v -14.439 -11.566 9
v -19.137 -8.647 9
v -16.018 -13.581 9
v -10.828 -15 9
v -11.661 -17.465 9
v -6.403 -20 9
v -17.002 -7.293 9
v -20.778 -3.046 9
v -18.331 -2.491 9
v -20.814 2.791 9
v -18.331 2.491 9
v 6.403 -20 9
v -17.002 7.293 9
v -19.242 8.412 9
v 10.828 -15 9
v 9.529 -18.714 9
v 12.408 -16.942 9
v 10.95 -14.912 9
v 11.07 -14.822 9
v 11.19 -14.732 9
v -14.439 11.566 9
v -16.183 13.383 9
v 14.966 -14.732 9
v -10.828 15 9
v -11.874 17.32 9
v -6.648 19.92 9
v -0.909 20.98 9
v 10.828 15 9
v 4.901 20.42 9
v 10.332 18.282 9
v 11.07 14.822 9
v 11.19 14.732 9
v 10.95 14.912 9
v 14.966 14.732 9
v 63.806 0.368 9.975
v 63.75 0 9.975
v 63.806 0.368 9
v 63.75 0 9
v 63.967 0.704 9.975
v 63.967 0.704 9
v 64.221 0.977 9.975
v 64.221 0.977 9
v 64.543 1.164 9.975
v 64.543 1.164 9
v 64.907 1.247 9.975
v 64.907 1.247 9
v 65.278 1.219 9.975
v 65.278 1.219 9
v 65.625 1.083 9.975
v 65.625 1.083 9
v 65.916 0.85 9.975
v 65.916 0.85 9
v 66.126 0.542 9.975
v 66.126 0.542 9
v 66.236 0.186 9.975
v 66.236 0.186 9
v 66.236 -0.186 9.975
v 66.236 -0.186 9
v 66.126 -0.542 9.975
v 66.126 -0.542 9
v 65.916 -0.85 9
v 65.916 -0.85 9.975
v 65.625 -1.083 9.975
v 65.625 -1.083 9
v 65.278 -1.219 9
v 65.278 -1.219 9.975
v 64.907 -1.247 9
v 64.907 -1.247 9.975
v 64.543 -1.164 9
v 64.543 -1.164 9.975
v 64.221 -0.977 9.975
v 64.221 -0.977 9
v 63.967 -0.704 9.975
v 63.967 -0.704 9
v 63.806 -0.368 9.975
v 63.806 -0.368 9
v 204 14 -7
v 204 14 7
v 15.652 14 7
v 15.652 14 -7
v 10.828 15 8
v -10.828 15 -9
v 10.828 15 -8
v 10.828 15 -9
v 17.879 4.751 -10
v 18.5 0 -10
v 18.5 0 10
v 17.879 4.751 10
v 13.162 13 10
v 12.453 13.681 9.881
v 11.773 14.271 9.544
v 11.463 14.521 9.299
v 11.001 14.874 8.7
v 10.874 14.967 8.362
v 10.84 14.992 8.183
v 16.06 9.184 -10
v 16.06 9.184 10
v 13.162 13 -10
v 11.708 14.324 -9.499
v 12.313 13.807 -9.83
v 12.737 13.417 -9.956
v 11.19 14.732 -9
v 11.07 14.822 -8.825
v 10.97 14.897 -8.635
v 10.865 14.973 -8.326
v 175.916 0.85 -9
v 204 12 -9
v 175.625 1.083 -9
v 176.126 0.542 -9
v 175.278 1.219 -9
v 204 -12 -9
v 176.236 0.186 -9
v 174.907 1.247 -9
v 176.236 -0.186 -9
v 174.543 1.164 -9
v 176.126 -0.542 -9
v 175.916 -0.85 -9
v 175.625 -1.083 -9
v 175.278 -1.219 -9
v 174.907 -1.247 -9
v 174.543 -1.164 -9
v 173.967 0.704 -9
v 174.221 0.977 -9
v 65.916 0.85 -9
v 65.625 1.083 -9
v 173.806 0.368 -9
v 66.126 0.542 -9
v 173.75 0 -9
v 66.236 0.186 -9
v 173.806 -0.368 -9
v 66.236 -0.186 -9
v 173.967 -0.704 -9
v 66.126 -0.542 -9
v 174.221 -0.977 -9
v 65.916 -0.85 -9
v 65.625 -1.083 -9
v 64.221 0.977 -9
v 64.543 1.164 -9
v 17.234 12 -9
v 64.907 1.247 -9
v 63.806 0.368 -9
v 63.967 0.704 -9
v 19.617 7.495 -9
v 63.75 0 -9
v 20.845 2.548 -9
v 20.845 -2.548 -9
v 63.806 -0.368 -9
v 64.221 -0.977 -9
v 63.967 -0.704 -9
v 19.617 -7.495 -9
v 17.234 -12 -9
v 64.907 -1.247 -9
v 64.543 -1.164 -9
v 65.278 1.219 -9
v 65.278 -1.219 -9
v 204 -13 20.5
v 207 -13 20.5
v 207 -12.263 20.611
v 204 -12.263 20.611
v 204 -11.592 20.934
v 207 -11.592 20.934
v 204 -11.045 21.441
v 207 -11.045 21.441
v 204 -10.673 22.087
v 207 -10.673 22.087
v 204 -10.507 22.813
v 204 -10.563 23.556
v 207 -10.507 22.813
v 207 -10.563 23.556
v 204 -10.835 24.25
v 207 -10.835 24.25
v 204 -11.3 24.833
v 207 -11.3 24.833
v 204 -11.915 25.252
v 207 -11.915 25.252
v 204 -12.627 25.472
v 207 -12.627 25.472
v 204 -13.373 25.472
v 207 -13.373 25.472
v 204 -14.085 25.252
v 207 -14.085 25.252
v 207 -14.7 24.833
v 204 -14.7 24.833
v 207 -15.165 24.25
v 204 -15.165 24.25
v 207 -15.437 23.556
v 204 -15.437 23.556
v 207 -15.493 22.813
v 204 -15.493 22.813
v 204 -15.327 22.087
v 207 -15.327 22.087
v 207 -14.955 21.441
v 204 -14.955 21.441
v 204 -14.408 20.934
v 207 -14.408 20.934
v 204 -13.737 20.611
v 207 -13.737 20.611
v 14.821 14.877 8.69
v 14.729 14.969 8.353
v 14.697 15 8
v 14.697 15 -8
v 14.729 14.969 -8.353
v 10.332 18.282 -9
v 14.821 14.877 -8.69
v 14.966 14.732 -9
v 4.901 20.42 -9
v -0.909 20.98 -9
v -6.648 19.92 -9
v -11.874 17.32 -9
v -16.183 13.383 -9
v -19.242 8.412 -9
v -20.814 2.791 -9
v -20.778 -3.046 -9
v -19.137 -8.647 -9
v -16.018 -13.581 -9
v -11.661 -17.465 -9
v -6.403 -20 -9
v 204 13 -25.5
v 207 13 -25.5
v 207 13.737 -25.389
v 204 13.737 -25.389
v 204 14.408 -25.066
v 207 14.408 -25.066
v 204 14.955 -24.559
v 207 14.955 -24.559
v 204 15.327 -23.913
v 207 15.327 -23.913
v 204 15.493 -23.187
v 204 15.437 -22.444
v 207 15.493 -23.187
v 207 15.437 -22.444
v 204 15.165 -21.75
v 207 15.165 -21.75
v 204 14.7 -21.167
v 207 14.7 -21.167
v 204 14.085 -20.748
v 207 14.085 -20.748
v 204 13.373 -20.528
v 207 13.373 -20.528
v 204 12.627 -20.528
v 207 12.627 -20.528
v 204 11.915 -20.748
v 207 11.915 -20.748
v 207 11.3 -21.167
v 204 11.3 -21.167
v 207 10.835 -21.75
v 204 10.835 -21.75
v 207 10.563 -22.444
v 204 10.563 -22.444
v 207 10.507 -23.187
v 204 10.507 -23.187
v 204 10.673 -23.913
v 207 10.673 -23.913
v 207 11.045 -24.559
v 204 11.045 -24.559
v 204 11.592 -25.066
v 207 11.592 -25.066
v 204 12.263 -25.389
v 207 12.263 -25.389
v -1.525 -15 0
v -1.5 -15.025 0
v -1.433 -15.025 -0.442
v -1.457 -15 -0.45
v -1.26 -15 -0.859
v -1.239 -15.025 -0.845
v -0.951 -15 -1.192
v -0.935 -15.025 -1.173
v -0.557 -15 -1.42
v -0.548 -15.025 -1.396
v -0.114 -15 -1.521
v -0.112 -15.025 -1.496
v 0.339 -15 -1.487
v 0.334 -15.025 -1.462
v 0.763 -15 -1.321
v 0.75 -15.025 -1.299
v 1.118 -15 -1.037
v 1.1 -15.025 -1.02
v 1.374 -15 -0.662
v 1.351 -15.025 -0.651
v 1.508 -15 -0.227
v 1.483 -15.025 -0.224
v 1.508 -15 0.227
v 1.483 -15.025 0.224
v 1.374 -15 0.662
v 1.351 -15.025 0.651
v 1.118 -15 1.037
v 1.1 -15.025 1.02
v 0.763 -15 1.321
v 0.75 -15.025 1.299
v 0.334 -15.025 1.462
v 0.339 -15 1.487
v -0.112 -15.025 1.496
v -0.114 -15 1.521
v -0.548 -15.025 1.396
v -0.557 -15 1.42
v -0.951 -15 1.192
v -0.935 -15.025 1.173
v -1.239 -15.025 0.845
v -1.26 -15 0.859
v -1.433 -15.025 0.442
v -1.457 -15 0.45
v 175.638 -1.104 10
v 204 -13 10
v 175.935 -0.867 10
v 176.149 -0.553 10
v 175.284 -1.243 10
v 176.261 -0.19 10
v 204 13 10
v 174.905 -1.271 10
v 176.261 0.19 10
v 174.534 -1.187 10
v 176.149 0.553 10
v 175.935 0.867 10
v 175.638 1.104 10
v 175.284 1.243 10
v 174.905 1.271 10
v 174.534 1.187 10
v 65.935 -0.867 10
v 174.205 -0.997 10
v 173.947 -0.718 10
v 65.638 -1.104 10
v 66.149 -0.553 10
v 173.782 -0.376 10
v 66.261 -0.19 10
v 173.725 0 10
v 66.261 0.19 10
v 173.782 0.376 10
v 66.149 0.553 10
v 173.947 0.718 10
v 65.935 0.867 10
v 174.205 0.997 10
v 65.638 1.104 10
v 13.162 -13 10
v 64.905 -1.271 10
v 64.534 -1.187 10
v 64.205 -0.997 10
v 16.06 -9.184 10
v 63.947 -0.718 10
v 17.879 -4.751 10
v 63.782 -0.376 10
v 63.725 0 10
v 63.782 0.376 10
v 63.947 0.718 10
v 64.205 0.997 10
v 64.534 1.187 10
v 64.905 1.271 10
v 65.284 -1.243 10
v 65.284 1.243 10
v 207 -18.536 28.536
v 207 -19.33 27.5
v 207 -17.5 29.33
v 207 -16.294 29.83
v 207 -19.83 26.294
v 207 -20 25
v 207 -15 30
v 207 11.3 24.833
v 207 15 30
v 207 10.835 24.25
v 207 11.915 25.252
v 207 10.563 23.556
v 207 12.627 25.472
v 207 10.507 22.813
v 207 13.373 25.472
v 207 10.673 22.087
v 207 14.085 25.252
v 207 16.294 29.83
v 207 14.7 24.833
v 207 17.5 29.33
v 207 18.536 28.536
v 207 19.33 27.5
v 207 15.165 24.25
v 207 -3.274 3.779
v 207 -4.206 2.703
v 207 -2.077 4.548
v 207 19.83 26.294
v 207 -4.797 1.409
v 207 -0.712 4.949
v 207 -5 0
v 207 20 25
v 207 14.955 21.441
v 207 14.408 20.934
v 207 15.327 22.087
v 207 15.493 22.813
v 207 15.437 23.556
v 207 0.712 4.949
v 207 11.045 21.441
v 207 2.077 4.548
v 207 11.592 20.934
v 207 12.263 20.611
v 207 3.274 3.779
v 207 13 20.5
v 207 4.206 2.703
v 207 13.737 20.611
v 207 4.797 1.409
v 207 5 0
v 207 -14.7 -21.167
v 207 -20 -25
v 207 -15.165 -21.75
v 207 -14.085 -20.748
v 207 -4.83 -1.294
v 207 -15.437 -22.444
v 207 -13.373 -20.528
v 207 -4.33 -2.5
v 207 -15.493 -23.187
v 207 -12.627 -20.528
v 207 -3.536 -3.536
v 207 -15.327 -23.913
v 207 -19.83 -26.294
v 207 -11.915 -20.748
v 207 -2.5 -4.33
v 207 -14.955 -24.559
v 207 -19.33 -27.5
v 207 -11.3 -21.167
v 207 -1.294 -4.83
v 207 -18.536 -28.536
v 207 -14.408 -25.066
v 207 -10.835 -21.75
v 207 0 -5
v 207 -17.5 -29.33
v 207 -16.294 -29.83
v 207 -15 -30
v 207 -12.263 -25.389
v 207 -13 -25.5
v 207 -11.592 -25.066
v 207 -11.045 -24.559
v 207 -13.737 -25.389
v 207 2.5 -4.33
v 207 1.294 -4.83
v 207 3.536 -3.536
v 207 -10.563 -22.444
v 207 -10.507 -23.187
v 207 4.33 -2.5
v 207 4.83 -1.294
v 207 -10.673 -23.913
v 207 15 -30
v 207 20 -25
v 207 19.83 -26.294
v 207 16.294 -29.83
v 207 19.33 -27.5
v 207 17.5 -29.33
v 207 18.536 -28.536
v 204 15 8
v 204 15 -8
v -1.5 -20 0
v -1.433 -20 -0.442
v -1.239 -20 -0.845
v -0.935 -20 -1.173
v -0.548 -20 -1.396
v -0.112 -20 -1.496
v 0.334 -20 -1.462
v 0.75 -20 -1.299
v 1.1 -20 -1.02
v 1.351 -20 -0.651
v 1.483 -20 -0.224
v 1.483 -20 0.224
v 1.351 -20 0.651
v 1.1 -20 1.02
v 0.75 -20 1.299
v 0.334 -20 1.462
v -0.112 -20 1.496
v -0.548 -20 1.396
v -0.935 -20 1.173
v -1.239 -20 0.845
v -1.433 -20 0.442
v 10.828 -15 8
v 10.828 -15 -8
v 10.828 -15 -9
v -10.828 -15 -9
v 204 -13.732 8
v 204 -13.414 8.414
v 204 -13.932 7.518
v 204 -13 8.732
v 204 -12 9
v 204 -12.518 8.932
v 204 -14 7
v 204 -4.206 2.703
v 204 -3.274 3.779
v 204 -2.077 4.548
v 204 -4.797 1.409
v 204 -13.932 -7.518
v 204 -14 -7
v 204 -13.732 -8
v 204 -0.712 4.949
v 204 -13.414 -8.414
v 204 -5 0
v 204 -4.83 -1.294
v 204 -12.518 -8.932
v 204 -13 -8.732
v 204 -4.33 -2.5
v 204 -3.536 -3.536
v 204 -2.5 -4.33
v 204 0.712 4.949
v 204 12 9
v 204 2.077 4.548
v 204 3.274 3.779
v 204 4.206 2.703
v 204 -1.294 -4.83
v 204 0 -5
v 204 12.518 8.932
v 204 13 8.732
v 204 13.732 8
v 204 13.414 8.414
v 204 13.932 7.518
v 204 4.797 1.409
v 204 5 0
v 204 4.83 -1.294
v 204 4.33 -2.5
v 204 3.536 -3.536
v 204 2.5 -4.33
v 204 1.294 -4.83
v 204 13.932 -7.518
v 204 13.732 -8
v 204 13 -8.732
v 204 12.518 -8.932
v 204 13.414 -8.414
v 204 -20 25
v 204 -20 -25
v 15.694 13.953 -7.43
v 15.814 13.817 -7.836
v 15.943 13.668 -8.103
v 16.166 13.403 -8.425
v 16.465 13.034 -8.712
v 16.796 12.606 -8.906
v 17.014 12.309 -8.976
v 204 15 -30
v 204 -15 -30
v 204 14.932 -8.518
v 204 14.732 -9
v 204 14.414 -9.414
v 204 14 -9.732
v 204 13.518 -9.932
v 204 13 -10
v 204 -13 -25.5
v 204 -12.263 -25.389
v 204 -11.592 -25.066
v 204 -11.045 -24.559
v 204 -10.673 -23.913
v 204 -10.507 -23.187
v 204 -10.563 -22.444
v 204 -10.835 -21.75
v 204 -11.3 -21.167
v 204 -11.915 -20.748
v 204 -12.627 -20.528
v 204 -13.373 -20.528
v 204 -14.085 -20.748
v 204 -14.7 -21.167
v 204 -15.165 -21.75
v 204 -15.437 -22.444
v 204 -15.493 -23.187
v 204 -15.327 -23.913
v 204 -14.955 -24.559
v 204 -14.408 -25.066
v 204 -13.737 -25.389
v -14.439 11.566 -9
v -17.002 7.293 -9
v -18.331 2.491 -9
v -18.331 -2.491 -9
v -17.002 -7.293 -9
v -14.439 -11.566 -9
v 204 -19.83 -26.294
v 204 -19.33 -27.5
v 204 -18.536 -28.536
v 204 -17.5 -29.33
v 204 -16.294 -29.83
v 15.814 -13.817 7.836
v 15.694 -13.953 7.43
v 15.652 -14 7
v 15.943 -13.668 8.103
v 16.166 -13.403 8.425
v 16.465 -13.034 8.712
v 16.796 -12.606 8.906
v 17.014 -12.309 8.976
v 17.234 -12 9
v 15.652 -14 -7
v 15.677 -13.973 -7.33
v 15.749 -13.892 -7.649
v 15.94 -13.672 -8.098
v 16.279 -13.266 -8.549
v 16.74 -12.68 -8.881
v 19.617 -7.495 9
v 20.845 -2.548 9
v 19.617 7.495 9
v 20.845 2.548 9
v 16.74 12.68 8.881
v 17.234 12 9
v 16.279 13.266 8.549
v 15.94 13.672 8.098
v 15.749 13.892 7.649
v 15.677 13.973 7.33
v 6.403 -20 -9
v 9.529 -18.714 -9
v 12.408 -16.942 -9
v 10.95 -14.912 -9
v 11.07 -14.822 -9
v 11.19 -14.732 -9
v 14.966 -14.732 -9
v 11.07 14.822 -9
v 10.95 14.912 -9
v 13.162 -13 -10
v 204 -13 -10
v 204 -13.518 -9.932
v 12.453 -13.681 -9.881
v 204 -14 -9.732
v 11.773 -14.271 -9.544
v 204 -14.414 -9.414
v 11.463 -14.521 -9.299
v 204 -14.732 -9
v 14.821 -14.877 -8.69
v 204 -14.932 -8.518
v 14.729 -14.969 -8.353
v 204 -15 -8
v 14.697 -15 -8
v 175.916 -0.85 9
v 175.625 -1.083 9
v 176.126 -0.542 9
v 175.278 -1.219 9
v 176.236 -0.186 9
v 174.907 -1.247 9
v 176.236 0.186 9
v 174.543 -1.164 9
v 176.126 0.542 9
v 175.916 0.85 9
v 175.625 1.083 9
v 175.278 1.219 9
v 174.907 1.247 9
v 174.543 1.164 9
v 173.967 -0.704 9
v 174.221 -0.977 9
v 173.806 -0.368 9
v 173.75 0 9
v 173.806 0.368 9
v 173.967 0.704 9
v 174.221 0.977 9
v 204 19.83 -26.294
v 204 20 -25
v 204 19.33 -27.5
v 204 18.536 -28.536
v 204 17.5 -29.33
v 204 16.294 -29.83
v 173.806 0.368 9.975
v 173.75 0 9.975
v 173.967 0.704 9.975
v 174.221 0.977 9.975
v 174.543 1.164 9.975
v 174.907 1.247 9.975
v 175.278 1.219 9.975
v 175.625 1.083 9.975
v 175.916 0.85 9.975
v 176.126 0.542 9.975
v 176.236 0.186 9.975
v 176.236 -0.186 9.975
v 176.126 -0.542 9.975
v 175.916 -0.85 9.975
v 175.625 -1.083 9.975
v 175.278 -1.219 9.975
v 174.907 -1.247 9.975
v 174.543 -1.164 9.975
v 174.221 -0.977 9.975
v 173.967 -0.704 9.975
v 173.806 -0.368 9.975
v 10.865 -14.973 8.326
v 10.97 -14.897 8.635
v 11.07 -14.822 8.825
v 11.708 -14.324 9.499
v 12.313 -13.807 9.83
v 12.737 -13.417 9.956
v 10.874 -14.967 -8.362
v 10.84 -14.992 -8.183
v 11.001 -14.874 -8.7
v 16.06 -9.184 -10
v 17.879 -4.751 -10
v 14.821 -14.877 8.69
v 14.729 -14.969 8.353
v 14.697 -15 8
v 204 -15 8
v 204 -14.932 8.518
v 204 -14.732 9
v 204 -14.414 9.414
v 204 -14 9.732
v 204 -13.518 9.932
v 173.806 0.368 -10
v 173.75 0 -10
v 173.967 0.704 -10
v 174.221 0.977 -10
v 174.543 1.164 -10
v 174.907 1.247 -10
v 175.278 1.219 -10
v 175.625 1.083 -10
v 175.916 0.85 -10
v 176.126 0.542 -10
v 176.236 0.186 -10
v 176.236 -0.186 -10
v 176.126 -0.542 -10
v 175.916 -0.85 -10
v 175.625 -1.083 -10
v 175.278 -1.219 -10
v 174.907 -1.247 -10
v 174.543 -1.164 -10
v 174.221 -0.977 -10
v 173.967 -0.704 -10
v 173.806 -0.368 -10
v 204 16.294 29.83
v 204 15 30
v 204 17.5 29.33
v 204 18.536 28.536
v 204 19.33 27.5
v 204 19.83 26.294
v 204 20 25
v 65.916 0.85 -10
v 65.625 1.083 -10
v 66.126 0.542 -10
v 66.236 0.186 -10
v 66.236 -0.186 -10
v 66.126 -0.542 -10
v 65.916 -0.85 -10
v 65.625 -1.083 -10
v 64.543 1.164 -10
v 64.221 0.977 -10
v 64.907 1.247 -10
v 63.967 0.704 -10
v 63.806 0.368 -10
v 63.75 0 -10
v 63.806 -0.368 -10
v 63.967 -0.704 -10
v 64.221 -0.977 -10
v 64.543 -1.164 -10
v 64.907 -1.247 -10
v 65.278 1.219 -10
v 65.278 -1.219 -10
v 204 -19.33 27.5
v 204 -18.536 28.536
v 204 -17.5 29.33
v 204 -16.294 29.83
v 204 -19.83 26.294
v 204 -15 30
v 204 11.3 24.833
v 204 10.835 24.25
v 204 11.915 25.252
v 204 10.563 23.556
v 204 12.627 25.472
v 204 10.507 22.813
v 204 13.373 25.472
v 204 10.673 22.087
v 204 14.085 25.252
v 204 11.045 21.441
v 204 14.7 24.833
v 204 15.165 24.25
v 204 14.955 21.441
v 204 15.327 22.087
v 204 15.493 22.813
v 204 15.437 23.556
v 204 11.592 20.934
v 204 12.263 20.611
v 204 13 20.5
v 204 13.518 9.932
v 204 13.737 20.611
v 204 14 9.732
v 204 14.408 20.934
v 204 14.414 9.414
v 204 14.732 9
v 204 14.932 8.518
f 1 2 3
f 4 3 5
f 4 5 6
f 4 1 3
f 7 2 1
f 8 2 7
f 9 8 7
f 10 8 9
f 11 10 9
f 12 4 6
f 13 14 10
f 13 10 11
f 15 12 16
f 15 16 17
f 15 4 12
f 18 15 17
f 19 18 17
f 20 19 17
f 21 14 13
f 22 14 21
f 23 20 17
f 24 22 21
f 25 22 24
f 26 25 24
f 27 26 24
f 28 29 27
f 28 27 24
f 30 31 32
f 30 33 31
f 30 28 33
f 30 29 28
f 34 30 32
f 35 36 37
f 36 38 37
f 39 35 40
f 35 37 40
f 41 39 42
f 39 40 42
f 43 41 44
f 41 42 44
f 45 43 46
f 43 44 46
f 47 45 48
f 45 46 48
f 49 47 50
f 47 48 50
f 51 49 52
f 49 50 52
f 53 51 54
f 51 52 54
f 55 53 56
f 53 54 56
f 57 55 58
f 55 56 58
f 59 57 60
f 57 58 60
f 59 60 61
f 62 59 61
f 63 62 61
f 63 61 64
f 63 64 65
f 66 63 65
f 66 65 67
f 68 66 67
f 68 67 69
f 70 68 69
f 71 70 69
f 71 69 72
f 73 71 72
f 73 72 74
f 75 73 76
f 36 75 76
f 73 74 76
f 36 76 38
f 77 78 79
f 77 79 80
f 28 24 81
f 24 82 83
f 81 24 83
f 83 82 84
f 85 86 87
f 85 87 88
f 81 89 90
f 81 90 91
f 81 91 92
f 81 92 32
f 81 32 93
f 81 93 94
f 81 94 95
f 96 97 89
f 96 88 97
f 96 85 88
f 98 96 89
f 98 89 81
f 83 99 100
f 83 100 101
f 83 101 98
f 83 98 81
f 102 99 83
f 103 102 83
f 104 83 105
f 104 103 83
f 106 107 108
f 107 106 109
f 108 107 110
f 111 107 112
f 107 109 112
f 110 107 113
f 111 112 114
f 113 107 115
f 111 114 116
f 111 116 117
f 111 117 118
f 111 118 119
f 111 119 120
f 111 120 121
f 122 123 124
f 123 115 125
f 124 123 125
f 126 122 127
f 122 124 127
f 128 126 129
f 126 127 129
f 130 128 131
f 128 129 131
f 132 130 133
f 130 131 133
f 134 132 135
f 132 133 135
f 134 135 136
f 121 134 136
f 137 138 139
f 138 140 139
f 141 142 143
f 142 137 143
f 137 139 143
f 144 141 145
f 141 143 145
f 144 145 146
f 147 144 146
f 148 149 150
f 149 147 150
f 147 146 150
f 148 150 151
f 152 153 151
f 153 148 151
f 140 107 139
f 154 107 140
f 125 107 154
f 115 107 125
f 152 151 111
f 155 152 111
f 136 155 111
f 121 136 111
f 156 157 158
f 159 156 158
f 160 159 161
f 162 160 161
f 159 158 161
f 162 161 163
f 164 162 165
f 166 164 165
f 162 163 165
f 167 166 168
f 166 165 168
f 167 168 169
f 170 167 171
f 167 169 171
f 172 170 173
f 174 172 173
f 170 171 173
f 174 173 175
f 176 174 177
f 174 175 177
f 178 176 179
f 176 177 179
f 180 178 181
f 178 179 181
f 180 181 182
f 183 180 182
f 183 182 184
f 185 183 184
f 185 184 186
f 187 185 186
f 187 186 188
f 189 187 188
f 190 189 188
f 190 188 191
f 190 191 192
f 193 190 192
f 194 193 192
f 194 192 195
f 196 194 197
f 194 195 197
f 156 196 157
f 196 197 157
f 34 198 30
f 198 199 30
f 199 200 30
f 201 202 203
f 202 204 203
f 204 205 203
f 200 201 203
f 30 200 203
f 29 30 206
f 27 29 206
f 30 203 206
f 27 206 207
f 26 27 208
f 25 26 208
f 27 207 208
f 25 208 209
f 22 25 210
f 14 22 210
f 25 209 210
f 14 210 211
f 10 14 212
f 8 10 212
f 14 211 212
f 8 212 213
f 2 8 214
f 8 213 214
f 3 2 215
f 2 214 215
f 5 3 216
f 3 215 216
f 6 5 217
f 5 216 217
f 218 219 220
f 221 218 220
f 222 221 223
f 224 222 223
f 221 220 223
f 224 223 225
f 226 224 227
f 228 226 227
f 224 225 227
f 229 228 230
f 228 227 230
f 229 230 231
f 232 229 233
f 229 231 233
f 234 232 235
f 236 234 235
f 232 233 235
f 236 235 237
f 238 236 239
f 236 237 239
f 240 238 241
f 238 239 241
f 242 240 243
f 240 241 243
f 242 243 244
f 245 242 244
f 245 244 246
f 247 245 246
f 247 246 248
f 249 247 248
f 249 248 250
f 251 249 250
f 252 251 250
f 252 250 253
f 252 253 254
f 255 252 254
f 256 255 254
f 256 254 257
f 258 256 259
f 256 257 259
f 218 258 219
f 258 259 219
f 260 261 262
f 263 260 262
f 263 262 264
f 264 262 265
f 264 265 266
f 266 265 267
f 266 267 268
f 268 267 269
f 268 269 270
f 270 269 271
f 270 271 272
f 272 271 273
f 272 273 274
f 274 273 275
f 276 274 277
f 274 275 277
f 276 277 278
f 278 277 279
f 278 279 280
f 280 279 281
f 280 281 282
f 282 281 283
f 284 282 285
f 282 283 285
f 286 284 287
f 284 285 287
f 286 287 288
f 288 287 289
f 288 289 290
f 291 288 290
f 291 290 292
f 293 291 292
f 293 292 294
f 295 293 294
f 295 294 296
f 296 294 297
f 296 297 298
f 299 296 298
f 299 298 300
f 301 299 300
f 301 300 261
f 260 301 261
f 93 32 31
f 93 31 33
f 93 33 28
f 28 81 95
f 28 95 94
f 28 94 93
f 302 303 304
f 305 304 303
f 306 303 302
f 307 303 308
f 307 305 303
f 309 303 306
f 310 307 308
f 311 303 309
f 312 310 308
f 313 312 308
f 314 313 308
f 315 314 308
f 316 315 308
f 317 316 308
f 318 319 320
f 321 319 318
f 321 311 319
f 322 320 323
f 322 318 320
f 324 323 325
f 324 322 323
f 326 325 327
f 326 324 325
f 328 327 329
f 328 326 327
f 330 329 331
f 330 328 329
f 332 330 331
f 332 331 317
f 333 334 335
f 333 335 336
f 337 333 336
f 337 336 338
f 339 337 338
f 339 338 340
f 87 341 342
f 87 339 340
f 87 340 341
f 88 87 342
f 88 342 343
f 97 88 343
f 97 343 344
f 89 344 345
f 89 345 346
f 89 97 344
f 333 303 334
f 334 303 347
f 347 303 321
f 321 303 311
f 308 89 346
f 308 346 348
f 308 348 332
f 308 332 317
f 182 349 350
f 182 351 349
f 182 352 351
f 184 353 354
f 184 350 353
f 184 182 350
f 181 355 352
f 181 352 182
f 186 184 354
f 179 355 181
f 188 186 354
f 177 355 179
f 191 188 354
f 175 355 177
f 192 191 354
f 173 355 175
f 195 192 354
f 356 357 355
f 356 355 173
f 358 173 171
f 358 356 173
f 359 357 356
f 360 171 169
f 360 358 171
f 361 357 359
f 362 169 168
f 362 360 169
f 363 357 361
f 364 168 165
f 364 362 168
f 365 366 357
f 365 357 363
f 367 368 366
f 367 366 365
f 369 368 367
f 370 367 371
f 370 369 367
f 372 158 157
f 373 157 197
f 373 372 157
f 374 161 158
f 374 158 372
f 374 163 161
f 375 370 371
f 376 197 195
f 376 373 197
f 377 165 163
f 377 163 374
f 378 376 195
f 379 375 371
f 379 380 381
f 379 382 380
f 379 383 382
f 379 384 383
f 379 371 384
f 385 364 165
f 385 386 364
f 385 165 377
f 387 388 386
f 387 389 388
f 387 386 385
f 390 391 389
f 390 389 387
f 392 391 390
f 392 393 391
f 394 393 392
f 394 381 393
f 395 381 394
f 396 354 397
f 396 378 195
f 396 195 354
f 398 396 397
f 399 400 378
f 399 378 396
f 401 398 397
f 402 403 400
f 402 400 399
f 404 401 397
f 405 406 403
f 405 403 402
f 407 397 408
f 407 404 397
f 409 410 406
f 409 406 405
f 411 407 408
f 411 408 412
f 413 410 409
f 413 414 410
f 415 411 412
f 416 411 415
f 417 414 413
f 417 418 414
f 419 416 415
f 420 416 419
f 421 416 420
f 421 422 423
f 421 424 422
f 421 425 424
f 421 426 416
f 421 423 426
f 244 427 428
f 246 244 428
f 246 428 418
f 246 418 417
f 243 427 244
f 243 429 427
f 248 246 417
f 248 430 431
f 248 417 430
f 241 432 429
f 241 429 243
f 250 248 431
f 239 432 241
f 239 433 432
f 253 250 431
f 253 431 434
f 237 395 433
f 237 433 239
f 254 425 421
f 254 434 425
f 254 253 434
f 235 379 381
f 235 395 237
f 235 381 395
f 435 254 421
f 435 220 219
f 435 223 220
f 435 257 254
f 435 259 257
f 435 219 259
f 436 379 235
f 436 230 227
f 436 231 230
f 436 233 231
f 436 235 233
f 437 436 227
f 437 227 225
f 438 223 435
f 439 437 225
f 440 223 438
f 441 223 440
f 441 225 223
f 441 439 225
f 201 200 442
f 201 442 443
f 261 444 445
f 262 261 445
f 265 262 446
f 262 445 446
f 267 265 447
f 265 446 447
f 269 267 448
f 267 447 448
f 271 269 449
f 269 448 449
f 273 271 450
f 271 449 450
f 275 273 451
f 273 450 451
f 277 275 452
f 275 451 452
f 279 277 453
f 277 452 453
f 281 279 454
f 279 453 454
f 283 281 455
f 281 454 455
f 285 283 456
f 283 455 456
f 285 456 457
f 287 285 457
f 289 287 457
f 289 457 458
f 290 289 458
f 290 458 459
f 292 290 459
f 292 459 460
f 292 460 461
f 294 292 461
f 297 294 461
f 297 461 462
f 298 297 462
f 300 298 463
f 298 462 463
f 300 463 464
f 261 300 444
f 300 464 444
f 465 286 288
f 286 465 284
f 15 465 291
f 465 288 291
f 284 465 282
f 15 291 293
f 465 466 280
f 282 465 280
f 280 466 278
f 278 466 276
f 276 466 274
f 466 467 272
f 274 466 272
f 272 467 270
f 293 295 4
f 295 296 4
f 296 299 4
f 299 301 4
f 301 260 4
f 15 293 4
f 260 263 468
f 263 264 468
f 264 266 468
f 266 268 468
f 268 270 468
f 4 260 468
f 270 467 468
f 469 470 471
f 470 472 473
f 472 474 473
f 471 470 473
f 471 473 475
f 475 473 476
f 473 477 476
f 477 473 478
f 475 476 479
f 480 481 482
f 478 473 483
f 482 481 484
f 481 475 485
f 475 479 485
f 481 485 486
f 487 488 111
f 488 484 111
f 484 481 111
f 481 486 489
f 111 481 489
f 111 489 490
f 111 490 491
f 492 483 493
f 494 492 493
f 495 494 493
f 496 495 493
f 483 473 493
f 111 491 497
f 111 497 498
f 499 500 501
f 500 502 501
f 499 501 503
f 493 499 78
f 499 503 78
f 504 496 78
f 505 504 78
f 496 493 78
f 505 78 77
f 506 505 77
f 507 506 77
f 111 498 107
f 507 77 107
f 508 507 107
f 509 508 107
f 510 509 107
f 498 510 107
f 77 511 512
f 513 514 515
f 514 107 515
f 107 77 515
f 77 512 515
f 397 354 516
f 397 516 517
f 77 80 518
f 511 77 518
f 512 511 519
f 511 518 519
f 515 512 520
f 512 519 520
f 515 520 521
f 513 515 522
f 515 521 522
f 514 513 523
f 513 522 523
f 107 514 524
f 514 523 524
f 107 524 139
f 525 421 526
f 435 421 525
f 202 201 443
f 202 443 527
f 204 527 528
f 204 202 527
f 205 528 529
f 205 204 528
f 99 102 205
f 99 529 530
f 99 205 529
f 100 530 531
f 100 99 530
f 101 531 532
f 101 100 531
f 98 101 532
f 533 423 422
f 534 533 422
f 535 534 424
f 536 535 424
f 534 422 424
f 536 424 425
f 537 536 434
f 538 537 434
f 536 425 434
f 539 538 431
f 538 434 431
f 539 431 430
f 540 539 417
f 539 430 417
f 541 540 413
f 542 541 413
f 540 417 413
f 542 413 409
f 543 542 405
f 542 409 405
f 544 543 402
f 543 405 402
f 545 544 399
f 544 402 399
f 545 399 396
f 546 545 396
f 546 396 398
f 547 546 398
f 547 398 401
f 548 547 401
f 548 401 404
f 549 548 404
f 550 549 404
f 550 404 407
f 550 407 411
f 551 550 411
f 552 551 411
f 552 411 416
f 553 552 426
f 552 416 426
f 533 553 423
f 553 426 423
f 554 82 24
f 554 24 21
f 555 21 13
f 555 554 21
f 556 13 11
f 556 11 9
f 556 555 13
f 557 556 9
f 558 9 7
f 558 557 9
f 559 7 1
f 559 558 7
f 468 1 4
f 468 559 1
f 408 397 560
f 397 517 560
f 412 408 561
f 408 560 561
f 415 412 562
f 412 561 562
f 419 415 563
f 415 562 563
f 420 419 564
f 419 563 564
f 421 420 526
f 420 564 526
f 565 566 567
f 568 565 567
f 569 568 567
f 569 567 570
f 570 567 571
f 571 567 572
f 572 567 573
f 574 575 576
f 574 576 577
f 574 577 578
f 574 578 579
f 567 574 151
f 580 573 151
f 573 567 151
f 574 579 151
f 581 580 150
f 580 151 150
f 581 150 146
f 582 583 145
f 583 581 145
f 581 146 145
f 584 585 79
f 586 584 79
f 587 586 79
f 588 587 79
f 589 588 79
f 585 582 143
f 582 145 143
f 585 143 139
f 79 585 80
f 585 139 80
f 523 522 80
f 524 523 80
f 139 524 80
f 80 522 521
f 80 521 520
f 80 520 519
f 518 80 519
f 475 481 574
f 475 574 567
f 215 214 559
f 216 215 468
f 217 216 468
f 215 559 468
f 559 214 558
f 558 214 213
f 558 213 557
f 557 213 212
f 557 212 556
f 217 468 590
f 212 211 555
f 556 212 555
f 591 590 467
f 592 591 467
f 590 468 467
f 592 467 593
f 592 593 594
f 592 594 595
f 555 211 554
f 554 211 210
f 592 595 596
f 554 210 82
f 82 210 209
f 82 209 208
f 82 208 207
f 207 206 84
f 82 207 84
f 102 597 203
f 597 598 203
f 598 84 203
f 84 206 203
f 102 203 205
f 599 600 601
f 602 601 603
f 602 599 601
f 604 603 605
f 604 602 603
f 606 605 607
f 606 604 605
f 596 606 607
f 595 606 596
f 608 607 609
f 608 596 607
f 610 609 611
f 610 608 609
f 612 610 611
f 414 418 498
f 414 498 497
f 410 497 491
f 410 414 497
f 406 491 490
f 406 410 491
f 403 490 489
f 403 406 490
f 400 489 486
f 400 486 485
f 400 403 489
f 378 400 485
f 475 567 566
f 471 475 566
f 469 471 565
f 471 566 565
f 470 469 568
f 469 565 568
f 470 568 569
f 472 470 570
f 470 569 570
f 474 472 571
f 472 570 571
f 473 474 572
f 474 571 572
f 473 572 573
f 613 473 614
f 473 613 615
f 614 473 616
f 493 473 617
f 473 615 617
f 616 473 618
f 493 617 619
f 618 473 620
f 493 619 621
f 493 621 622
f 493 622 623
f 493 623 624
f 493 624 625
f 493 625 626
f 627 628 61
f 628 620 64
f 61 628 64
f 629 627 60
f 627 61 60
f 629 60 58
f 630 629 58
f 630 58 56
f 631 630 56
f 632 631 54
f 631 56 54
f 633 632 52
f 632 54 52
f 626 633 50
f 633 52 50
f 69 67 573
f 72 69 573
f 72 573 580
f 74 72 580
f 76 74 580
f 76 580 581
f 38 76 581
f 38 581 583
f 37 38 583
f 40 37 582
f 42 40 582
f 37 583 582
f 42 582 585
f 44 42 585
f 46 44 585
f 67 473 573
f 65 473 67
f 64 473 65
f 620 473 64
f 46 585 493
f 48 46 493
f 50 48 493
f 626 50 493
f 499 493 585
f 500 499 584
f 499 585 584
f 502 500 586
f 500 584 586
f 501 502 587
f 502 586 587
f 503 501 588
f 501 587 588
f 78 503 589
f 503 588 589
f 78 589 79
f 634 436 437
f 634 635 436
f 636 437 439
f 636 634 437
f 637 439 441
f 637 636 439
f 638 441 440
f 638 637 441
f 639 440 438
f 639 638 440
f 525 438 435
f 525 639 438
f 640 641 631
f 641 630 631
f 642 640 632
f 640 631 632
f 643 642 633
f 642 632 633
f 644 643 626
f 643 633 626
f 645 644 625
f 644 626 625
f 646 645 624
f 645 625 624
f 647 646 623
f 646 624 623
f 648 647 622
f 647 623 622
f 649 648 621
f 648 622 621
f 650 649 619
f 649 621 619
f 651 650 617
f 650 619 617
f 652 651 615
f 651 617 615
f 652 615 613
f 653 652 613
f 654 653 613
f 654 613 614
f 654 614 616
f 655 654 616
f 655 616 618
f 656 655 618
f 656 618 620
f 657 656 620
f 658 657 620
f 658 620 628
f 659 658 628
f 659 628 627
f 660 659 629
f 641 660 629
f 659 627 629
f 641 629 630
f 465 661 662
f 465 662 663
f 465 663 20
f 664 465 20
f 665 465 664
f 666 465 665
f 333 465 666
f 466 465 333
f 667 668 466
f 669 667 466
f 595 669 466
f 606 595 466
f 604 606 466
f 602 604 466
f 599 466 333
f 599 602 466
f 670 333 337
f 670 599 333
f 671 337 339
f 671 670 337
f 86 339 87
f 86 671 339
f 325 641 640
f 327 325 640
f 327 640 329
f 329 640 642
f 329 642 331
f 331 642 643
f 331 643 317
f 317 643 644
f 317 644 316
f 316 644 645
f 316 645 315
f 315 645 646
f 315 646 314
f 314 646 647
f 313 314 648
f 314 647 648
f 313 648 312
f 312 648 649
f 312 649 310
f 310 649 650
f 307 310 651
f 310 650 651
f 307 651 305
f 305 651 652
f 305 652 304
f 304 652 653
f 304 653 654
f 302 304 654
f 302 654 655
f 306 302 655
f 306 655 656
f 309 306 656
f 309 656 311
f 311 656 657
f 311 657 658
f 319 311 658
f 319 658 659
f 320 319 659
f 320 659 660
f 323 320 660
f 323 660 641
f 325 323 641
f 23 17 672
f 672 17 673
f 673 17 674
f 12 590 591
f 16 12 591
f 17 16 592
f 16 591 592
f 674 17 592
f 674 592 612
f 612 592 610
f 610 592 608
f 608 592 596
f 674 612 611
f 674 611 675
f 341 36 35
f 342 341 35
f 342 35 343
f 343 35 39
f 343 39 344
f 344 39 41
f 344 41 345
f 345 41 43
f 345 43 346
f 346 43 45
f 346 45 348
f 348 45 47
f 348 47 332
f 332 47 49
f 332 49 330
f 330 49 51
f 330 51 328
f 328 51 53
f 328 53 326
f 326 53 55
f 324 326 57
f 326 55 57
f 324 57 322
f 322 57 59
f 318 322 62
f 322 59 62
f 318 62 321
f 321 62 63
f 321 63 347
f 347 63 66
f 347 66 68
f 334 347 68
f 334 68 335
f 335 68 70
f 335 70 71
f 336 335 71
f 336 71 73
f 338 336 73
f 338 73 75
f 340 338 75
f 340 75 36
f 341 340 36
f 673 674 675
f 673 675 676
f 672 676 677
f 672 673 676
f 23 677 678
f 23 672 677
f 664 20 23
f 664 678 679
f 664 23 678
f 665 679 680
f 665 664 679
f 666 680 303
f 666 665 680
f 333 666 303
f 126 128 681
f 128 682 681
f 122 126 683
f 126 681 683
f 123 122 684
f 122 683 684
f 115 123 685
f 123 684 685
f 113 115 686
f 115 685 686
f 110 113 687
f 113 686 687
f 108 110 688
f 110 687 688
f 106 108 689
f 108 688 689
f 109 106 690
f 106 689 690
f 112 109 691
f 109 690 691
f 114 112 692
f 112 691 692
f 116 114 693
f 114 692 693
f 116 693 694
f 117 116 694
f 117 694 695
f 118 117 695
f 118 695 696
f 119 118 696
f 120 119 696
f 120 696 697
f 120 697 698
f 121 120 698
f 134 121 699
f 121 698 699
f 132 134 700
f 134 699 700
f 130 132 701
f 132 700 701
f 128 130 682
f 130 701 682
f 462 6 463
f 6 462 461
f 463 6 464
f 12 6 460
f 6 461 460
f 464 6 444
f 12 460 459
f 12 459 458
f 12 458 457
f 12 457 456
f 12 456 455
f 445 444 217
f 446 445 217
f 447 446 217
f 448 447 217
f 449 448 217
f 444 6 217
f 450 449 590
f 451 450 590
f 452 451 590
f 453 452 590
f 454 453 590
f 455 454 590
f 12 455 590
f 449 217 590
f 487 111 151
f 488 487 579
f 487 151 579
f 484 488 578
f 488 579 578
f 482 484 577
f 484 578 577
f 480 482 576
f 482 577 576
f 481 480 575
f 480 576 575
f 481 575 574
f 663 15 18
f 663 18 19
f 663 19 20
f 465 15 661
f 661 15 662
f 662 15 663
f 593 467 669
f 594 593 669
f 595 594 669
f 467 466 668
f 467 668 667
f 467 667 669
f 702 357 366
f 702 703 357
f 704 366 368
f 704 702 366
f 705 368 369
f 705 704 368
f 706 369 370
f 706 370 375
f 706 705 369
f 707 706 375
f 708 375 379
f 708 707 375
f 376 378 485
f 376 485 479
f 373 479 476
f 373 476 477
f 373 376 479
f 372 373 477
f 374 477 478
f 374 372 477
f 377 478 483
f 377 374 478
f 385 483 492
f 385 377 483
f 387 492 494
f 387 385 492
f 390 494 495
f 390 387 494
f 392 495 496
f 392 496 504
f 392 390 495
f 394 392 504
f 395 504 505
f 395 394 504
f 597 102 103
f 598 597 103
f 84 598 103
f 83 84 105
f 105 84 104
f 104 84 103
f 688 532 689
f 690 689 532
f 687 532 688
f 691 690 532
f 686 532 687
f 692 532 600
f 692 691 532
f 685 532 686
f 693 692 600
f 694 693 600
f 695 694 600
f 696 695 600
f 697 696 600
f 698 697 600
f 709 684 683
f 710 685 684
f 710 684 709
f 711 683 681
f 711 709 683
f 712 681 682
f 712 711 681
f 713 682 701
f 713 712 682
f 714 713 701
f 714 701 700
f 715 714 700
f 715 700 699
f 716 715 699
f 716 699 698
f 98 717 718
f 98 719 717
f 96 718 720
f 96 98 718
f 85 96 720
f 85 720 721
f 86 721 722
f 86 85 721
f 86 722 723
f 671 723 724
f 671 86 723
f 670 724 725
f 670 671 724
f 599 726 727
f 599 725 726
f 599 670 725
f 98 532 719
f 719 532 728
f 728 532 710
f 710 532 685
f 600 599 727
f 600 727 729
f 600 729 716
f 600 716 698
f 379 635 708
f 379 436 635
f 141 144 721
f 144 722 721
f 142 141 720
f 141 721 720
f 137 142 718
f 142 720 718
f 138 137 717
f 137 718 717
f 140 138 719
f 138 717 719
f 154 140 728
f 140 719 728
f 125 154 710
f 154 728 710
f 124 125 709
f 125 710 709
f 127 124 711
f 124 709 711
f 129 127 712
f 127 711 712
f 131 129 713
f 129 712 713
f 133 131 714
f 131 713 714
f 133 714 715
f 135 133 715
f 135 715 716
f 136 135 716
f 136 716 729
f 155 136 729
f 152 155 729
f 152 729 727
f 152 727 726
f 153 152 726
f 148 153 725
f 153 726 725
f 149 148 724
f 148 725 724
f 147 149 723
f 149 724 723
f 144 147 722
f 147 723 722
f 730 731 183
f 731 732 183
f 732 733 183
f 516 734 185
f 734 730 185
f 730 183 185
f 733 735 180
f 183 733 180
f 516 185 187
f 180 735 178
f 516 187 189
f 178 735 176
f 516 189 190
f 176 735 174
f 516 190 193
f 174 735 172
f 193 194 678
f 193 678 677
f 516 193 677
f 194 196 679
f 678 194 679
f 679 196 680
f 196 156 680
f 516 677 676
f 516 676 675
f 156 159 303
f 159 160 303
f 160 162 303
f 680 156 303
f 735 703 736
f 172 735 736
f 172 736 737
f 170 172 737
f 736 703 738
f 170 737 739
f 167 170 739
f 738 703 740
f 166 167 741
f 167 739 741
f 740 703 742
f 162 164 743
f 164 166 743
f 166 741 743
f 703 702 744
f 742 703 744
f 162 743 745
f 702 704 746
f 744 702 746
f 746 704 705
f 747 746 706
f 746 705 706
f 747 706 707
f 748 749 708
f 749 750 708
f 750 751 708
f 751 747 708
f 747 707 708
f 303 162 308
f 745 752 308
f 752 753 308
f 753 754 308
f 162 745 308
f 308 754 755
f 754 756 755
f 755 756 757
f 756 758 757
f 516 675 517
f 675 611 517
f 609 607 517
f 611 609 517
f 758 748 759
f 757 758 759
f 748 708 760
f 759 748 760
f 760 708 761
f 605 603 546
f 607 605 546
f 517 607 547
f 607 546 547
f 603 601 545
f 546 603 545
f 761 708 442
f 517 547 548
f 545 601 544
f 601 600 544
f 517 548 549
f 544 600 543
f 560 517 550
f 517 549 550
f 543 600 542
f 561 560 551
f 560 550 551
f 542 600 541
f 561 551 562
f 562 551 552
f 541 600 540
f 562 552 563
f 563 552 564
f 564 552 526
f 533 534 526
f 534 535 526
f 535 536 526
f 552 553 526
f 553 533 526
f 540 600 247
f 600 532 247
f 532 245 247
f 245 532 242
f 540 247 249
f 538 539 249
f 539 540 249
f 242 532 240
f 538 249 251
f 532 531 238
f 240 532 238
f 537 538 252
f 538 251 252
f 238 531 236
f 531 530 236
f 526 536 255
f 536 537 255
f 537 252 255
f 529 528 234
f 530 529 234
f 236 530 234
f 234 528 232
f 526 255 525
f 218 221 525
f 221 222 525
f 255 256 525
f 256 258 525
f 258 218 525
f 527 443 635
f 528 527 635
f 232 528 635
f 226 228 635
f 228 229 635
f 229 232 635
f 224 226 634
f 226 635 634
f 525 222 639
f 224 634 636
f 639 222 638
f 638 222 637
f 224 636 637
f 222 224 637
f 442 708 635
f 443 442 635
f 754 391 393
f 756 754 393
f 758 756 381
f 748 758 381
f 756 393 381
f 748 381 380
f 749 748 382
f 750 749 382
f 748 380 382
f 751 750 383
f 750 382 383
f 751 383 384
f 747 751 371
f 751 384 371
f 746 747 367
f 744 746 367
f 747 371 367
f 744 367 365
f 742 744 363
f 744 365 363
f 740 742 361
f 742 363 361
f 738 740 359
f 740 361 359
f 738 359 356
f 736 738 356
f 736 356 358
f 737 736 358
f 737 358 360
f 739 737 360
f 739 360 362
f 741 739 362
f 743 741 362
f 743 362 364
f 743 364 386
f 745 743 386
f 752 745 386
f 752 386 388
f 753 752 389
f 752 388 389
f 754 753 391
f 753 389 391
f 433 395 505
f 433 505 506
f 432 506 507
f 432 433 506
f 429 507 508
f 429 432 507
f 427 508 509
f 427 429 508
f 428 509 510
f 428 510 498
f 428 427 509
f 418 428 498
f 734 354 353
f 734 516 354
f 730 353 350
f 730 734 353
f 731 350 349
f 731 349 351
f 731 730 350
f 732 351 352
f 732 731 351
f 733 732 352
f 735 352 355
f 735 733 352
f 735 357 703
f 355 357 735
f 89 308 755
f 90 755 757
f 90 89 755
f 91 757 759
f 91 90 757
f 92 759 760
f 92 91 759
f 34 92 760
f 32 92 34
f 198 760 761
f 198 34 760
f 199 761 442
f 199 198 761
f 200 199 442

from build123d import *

# Parameters (mm, degrees)
BOSS_EXTRUDE1_DEPTH             = 207
SKETCH9_W                       = 60.00000000000001
SKETCH9_H                       = 40.00000000000001
SKETCH9_R                       = 5.000000000000005
SKETCH9_R_2                     = 2.5000000000000018
BOSS_EXTRUDE2_DEPTH             = 3
BOSS_EXTRUDE3_DEPTH             = 9
BOSS_EXTRUDE3_DEPTH_BACK        = 9
SKETCH10_R                      = 21
CUT_EXTRUDE1_DEPTH              = 19
CUT_EXTRUDE1_DEPTH_BACK         = 19
F_3_0MM_DOWEL_HOLE1_D           = 3
F_3_0MM_DOWEL_HOLE1_DEPTH       = 7.5
F_3_0MM_DOWEL_HOLE1_CSINK_D     = 3.05
F_3_0MM_DOWEL_HOLE1_CSINK_ANGLE = 90
F_3_0MM_DOWEL_HOLE1_TIP         = 0.9012909285413404
FILLET1_R                       = 5
SKETCH13_W                      = 19.825171117808697
SKETCH13_H                      = 19.67209798719679
CUT_EXTRUDE2_DEPTH              = 10
F_2_5MM_DOWEL_HOLE1_D           = 2.5
F_2_5MM_DOWEL_HOLE1_CSINK_D     = 2.55
F_2_5MM_DOWEL_HOLE1_CSINK_ANGLE = 90


with BuildPart() as part:
    # Sketch2 → Boss-Extrude1 (new body)
    with BuildSketch(Plane(origin=(0, 0, 0), x_dir=(0, 0, -1), z_dir=(1, 0, 0))):
        with BuildLine():
            Line((-7.999999999999989, 15), (7.999999999999983, 15))
            ThreePointArc((7.999999999999983, 15), (9.414213562373092, 14.414213562373094), (9.999999999999996, 12.999999999999986))
            Line((9.999999999999996, 12.999999999999986), (10, -12.999999999999986))
            ThreePointArc((10, -12.999999999999986), (9.414213562373096, -14.414213562373094), (7.999999999999987, -15))
            Line((7.999999999999987, -15), (-7.999999999999987, -15))
            ThreePointArc((-7.999999999999987, -15), (-9.414213562373096, -14.414213562373094), (-10, -12.999999999999986))
            Line((-10, -12.999999999999986), (-10.000000000000004, 12.999999999999986))
            ThreePointArc((-10.000000000000004, 12.999999999999986), (-9.4142135623731, 14.414213562373096), (-7.999999999999989, 15))
        make_face()
        with BuildLine():
            Line((-6.999999999999988, 13.999999999999996), (6.999999999999982, 13.999999999999996))
            ThreePointArc((6.999999999999982, 13.999999999999996), (8.41421356237309, 13.41421356237309), (8.999999999999996, 11.999999999999982))
            Line((8.999999999999996, 11.999999999999982), (9.000000000000002, -11.999999999999988))
            ThreePointArc((9.000000000000002, -11.999999999999988), (8.414213562373096, -13.414213562373098), (6.999999999999987, -14.000000000000002))
            Line((6.999999999999987, -14.000000000000002), (-6.999999999999984, -14.000000000000002))
            ThreePointArc((-6.999999999999984, -14.000000000000002), (-8.414213562373092, -13.414213562373096), (-8.999999999999998, -11.999999999999988))
            Line((-8.999999999999998, -11.999999999999988), (-9.000000000000004, 11.999999999999982))
            ThreePointArc((-9.000000000000004, 11.999999999999982), (-8.4142135623731, 13.414213562373092), (-6.999999999999988, 13.999999999999996))
        make_face(mode=Mode.SUBTRACT)
    extrude(amount=BOSS_EXTRUDE1_DEPTH)

    # Sketch9 → Boss-Extrude2 (add)
    with BuildSketch(Plane(origin=(207, 0, 0), x_dir=(0, 0, -1), z_dir=(1, 0, 0))):
        Rectangle(SKETCH9_W, SKETCH9_H)
        Circle(SKETCH9_R, mode=Mode.SUBTRACT)
        with Locations((-22.999999999999996, -13)):
            Circle(SKETCH9_R_2, mode=Mode.SUBTRACT)
        with Locations((-23, 13)):
            Circle(SKETCH9_R_2, mode=Mode.SUBTRACT)
        with Locations((22.999999999999996, -13)):
            Circle(SKETCH9_R_2, mode=Mode.SUBTRACT)
        with Locations((23, 13)):
            Circle(SKETCH9_R_2, mode=Mode.SUBTRACT)
    extrude(amount=-BOSS_EXTRUDE2_DEPTH)

    # Sketch10 → Boss-Extrude3 (add, two sides: drawn at the far end of the back side and taken through both)
    with BuildSketch(Plane.XY.offset(-BOSS_EXTRUDE3_DEPTH_BACK)):
        Circle(SKETCH10_R)
        with BuildLine():
            Line((10.828203913853855, -15.000000000000002), (-10.828203913853855, -15.000000000000002))
            ThreePointArc((-10.828203913853852, -15.000000000000005), (-18.5, -5.95e-15), (-10.828203913853862, 14.999999999999996))
            Line((-10.82820391385386, 14.999999999999996), (10.82820391385386, 14.999999999999996))
            ThreePointArc((10.828203913853862, 14.999999999999998), (18.5, -3.55e-15), (10.828203913853855, -15.000000000000002))
        make_face(mode=Mode.SUBTRACT)
    extrude(amount=BOSS_EXTRUDE3_DEPTH + BOSS_EXTRUDE3_DEPTH_BACK)

    # Sketch10<3> → Cut-Extrude1 (cut, two sides: drawn at the far end of the back side and taken through both)
    with BuildSketch(Plane.XY.offset(-CUT_EXTRUDE1_DEPTH_BACK)):
        with BuildLine():
            Line((-10.828203913853855, -15.000000000000002), (10.828203913853855, -15.000000000000002))
            ThreePointArc((10.828203913853848, -15.000000000000009), (16.47075851936237, -8.42402004964684), (18.5, -4.53e-15))
            ThreePointArc((18.5, 0), (16.470758519362374, 8.424020049646831), (10.828203913853859, 14.999999999999998))
            Line((10.82820391385386, 14.999999999999996), (-10.82820391385386, 14.999999999999996))
            ThreePointArc((-10.828203913853862, 14.999999999999996), (-18.5, -5.95e-15), (-10.828203913853852, -15.000000000000005))
        make_face()
    extrude(amount=CUT_EXTRUDE1_DEPTH + CUT_EXTRUDE1_DEPTH_BACK, mode=Mode.SUBTRACT)

    # Ø3.0mm Dowel Hole1
    with Locations(Plane(origin=(0, -15.000000000000002, 0), x_dir=(1, 0, 0), z_dir=(0, 1, 0))):
        with Locations((0, 0)):
            CounterSinkHole(F_3_0MM_DOWEL_HOLE1_D / 2, F_3_0MM_DOWEL_HOLE1_CSINK_D / 2, depth=F_3_0MM_DOWEL_HOLE1_DEPTH, counter_sink_angle=F_3_0MM_DOWEL_HOLE1_CSINK_ANGLE)
            with Locations((0, 0, -(F_3_0MM_DOWEL_HOLE1_DEPTH + F_3_0MM_DOWEL_HOLE1_TIP / 2))):  # 118° drill point
                Cone(0, F_3_0MM_DOWEL_HOLE1_D / 2, F_3_0MM_DOWEL_HOLE1_TIP, mode=Mode.SUBTRACT)

    # Fillet1
    fillet1_edges = [part.edges().sort_by_distance(p)[0] for p in [
        (205.5, 20.000000000000004, 30),
        (205.5, -20.000000000000004, 30),
        (205.5, -20.000000000000004, -30),
        (205.5, 20.000000000000004, -30),
    ]]
    fillet(fillet1_edges, radius=FILLET1_R)

    # Sketch13 → Cut-Extrude2 (cut)
    with BuildSketch(Plane(origin=(0, -20, 0), x_dir=(1, 0, 0), z_dir=(0, 1, 0))):
        Rectangle(SKETCH13_W, SKETCH13_H)
    extrude(amount=-CUT_EXTRUDE2_DEPTH, mode=Mode.SUBTRACT)

    # Ø2.5mm Dowel Hole1 (through all)
    with Locations(Plane.XY.offset(10.000000000000002)):
        with Locations((65, 0), (175, 0)):
            CounterSinkHole(F_2_5MM_DOWEL_HOLE1_D / 2, F_2_5MM_DOWEL_HOLE1_CSINK_D / 2, counter_sink_angle=F_2_5MM_DOWEL_HOLE1_CSINK_ANGLE)


solid = part.part
